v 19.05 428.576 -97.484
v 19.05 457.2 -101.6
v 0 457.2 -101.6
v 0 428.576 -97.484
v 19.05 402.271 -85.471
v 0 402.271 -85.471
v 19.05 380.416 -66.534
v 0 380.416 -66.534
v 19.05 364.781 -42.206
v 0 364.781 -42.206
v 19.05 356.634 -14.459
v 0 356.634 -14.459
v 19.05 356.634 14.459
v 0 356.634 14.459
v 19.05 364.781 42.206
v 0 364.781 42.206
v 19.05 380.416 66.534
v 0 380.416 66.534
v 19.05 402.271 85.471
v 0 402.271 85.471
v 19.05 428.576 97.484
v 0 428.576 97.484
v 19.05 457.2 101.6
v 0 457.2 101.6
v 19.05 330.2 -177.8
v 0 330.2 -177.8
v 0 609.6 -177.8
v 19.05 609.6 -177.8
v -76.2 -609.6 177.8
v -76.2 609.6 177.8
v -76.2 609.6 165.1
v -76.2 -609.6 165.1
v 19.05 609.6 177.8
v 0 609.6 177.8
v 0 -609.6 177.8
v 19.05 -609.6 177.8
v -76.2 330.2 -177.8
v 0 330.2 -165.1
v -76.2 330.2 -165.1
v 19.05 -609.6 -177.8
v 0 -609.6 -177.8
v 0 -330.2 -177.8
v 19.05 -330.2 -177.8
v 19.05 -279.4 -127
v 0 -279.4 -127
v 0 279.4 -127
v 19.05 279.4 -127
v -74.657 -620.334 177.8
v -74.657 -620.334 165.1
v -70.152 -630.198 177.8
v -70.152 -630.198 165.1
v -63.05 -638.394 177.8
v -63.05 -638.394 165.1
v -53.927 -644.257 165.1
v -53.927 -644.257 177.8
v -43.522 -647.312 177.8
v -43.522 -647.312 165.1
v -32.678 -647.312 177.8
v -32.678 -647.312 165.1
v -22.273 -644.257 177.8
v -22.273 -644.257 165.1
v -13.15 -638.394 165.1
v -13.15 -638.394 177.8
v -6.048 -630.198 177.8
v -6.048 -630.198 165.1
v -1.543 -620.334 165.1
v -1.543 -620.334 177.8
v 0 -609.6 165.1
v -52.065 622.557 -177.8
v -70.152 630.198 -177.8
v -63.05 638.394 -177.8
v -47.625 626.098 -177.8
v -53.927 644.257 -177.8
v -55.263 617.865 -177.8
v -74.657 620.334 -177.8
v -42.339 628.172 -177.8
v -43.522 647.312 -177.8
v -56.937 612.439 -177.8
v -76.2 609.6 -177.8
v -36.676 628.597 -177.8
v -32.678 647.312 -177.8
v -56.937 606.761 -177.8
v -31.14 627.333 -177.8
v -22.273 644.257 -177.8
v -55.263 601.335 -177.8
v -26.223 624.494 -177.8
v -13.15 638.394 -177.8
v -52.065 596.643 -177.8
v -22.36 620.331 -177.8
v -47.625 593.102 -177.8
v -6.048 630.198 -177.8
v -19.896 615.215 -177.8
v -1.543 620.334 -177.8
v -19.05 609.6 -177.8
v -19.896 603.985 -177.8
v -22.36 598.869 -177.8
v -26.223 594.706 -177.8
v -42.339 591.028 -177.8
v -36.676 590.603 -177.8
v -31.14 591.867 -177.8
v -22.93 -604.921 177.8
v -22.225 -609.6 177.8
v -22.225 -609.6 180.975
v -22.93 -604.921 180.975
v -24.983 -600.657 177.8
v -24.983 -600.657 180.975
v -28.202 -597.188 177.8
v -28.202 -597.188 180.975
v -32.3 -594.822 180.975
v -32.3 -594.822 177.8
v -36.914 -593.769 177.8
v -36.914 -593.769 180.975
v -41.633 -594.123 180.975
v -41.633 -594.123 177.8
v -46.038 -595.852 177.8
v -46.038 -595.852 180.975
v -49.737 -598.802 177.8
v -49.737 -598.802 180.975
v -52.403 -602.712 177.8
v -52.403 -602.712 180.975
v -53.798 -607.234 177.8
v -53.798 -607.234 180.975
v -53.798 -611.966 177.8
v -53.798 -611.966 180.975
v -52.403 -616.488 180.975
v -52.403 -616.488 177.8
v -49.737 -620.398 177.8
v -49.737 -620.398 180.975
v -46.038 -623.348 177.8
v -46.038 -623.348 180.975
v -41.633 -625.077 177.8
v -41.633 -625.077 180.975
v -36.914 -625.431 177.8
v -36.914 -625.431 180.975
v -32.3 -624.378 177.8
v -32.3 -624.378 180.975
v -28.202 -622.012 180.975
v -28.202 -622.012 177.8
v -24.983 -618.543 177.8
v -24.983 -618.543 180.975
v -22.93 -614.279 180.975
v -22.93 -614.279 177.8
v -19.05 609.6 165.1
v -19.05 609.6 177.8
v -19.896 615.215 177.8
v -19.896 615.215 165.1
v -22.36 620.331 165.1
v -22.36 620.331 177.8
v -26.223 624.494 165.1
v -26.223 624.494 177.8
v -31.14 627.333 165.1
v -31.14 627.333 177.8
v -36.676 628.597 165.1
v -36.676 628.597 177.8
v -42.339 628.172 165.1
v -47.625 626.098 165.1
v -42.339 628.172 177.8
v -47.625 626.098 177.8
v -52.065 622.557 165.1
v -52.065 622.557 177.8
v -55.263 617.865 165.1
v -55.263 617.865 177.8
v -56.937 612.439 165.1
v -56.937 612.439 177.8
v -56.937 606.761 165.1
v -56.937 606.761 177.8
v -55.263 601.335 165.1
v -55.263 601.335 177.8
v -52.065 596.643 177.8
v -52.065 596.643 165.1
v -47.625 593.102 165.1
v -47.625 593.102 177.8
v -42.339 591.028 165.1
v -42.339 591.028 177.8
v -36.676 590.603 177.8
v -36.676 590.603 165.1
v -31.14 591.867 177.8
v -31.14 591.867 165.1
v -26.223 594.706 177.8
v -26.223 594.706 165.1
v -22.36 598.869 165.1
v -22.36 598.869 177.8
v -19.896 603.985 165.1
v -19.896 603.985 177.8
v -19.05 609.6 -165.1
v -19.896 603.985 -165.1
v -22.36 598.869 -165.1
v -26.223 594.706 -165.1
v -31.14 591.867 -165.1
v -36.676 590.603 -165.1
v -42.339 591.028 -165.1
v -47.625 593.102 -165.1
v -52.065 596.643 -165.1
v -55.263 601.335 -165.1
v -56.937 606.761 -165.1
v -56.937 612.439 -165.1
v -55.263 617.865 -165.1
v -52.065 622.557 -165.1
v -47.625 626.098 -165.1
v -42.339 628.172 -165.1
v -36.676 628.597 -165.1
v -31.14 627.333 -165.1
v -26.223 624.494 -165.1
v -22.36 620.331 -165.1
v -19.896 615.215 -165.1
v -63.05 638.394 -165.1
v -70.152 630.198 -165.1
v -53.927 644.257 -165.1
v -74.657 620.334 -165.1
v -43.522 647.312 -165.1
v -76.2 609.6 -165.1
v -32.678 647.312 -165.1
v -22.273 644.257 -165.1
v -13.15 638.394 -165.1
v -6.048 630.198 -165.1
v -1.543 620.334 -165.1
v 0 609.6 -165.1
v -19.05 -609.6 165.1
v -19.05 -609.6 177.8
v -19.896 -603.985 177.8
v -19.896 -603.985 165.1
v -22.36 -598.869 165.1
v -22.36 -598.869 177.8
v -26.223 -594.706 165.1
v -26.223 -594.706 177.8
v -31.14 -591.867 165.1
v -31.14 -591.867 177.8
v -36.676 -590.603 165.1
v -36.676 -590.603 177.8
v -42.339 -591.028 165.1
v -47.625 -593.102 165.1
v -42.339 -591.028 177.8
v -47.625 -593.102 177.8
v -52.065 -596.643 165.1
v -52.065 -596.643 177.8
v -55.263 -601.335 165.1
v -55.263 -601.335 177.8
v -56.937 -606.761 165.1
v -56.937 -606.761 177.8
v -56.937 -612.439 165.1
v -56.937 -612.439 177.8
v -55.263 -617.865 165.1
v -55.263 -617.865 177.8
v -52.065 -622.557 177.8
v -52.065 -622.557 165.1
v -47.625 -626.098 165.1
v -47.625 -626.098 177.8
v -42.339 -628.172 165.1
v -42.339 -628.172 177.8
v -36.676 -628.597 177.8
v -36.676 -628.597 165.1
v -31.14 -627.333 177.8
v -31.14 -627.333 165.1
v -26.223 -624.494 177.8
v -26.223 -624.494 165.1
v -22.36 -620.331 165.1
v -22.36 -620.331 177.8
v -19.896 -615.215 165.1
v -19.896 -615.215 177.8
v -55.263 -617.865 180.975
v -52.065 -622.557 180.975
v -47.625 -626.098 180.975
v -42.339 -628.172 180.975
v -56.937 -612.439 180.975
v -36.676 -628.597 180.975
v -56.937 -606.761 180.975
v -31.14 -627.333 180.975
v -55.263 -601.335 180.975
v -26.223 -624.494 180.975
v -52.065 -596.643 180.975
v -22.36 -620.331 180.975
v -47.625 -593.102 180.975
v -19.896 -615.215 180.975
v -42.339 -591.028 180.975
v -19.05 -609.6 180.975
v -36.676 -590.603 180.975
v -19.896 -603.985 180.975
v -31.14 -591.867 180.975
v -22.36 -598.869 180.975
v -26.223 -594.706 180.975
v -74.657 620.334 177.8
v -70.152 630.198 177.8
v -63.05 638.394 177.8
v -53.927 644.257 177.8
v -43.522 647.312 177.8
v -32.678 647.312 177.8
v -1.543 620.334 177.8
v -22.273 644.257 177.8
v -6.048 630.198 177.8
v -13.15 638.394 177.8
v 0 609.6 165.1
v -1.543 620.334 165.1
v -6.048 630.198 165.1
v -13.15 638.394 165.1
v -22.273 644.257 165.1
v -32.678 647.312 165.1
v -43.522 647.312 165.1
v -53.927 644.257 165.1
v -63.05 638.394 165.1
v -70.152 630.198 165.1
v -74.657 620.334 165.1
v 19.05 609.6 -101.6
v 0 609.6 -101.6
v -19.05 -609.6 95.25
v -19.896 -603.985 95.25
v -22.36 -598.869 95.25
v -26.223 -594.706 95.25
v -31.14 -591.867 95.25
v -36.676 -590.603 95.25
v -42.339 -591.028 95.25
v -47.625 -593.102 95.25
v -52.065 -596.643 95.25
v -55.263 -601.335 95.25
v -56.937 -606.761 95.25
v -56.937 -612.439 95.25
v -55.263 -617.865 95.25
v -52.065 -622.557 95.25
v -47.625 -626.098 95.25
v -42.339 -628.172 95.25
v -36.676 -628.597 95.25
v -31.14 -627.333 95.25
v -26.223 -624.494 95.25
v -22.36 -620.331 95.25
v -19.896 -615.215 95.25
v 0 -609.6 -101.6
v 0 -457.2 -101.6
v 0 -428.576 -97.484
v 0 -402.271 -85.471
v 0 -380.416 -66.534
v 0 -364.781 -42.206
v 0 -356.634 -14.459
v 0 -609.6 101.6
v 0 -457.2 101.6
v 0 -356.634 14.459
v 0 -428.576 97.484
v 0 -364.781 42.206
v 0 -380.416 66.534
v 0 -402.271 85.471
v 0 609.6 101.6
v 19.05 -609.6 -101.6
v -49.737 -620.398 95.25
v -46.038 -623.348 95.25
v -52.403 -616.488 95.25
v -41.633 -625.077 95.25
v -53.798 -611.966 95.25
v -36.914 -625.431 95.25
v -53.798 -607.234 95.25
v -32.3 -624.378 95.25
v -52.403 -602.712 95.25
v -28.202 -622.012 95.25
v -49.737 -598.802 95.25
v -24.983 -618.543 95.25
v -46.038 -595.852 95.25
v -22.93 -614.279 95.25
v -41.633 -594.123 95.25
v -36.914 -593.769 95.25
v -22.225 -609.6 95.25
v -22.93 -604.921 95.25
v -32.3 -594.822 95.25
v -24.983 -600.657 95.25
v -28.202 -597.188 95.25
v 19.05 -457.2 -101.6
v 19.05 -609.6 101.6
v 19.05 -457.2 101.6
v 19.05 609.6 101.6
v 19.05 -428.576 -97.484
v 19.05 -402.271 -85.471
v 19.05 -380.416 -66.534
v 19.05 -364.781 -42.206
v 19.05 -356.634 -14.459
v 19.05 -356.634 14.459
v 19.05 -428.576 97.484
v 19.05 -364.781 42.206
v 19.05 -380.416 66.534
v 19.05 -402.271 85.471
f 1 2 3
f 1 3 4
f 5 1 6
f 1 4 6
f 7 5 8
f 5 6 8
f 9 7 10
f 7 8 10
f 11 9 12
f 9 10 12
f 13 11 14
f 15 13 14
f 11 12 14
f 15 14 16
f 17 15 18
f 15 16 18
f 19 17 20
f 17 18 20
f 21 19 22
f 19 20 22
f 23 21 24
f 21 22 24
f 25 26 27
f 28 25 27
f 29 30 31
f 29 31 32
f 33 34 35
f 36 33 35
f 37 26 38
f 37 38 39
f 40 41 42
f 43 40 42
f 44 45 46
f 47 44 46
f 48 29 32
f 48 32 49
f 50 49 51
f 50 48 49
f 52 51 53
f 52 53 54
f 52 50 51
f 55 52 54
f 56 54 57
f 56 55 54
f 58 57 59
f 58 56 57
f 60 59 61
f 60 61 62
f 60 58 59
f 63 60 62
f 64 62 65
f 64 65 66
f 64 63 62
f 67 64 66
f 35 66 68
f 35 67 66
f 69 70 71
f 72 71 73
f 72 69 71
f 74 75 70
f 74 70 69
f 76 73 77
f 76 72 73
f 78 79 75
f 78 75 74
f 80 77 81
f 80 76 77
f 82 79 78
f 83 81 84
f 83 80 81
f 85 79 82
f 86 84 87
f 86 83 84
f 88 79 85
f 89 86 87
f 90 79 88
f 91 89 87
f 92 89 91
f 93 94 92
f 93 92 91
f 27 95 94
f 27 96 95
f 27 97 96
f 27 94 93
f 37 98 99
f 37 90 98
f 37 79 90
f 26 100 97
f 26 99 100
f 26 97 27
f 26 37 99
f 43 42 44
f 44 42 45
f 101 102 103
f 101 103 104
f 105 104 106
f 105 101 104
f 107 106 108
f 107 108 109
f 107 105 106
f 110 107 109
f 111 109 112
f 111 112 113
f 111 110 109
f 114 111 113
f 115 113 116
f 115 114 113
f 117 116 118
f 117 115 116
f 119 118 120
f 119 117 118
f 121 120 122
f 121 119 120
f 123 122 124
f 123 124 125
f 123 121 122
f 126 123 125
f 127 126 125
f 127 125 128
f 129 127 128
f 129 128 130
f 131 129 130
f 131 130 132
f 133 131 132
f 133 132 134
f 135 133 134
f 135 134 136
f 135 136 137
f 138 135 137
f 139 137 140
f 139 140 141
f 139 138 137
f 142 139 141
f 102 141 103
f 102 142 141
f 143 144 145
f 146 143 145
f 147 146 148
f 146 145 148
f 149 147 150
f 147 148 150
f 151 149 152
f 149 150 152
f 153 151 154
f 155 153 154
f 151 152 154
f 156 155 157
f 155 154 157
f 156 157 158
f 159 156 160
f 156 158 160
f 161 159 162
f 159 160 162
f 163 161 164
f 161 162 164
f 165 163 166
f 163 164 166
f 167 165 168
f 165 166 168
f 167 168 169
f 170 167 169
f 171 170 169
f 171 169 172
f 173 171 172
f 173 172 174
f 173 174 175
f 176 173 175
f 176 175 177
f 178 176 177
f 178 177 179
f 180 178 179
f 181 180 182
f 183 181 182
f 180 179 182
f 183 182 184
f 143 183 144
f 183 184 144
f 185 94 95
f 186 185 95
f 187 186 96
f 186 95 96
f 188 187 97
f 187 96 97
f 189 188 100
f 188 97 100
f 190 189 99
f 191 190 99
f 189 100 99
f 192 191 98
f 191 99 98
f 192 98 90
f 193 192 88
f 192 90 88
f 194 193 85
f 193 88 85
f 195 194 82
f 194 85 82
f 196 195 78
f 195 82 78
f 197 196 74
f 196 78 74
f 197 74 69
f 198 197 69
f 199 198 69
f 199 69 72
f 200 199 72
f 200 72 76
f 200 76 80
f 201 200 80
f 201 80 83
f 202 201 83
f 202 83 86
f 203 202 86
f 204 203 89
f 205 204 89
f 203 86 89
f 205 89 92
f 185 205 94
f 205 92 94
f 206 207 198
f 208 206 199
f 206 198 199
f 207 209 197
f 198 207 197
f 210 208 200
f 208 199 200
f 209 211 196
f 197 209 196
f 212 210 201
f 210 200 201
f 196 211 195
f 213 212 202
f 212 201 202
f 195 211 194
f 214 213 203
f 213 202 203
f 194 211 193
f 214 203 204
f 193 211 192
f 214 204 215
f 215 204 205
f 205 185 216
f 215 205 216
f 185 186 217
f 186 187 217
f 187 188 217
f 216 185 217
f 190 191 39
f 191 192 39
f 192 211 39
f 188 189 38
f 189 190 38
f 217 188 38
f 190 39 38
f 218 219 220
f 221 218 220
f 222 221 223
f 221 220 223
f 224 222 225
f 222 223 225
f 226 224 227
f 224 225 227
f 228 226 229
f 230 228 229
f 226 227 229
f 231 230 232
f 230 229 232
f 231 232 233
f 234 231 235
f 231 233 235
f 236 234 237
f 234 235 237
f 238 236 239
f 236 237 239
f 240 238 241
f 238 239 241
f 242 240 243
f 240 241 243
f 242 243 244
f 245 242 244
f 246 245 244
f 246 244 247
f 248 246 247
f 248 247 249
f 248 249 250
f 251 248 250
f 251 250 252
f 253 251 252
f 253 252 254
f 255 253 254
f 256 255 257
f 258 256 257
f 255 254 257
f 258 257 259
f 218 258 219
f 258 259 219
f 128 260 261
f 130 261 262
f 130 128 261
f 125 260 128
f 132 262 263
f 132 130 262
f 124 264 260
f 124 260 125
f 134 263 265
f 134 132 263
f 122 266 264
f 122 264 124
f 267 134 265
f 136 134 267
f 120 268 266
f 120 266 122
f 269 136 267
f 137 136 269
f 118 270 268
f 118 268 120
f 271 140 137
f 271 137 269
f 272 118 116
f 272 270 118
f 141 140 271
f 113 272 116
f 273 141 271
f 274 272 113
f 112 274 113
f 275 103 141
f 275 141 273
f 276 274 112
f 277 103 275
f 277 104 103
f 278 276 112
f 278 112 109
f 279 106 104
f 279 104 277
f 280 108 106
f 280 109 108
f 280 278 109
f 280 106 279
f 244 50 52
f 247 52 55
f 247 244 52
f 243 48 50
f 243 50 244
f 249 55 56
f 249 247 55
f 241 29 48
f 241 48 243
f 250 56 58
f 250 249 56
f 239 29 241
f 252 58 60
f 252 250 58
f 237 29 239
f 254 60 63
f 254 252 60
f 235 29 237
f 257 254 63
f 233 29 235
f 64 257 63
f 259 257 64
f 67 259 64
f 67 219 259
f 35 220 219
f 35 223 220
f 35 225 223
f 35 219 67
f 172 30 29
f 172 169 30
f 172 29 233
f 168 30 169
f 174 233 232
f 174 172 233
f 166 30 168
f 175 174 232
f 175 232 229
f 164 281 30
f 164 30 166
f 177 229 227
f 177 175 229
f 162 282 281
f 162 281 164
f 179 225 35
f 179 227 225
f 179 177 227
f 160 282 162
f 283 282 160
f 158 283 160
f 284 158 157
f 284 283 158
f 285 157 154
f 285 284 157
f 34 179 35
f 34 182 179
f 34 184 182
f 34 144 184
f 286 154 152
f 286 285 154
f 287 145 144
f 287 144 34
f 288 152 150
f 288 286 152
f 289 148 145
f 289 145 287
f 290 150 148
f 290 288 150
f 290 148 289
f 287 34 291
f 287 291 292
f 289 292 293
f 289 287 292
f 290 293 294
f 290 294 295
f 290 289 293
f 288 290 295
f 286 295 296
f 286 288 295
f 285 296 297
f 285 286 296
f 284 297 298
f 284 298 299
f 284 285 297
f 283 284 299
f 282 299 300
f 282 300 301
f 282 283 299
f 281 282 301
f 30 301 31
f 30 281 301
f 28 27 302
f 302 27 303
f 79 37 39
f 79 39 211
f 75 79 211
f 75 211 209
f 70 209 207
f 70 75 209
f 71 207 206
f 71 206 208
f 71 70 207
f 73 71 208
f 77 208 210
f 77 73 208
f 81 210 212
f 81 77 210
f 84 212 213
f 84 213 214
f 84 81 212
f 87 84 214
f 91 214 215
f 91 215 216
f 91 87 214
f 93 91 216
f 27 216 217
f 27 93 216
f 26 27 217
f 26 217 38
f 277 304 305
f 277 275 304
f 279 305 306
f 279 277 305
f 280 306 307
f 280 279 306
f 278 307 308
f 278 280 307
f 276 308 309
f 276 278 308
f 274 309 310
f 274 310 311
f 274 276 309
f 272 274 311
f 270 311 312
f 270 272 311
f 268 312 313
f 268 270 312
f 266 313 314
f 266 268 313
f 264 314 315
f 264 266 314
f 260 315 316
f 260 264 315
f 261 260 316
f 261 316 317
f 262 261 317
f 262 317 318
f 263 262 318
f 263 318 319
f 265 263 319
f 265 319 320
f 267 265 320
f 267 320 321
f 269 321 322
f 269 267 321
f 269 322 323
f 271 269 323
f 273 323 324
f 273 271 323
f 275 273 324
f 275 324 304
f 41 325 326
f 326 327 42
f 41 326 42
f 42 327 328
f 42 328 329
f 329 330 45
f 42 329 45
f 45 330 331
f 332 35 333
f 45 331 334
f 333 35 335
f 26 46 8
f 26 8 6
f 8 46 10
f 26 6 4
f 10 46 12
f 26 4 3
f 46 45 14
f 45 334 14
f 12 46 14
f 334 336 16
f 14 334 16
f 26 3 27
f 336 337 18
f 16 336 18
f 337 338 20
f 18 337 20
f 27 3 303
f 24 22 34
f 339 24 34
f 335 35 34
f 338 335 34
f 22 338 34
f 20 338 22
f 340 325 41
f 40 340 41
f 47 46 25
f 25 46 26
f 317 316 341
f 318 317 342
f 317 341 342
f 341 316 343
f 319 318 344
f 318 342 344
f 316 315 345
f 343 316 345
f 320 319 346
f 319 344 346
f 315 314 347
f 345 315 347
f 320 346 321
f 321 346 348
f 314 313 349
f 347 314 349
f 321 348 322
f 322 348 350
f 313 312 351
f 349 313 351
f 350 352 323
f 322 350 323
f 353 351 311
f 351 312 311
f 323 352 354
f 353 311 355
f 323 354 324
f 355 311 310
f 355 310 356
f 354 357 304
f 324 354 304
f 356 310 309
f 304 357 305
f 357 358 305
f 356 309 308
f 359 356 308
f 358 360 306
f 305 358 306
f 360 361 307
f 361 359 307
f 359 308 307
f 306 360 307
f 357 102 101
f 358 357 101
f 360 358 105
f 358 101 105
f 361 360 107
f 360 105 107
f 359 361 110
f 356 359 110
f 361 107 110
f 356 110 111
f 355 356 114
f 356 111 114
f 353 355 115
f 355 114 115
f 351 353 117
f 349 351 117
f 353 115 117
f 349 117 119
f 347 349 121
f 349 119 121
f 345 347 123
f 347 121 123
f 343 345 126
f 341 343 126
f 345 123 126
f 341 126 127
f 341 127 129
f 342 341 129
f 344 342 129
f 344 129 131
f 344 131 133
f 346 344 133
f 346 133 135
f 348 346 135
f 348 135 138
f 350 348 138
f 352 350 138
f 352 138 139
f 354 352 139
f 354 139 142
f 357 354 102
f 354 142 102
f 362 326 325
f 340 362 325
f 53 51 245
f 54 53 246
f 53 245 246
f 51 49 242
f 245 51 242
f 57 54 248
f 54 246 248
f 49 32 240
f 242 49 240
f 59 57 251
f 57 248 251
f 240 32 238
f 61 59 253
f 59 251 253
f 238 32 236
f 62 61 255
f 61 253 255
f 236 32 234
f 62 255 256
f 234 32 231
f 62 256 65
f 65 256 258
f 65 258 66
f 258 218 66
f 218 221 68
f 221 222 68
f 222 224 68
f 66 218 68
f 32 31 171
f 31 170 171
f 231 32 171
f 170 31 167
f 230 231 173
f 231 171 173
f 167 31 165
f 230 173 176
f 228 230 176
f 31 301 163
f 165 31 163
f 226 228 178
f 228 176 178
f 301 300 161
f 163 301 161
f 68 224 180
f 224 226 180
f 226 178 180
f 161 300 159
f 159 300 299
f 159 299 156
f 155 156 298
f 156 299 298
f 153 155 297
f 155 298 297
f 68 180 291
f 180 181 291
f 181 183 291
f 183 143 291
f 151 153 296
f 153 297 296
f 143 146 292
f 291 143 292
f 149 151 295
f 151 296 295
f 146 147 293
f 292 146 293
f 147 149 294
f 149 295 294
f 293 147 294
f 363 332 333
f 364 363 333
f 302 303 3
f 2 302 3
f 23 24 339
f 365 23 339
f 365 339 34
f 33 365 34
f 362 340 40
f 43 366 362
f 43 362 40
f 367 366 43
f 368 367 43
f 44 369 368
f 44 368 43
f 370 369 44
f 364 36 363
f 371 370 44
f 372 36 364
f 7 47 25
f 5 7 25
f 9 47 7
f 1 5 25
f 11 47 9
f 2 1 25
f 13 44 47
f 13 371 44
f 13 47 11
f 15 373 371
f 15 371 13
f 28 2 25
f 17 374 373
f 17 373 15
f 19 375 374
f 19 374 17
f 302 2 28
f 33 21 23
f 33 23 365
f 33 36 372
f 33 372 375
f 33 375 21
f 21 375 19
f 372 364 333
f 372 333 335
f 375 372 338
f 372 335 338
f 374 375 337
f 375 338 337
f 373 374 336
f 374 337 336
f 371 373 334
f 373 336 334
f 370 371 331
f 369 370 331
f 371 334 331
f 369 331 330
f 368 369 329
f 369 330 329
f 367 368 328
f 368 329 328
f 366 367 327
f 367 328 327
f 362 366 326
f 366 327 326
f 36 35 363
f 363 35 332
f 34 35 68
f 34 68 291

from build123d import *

# Parameters (mm, degrees)
F1_DEPTH      = 19.05
F2_R          = 19.05
F3_DEPTH      = 12.7
F4_R          = 19.05
F5_DEPTH      = 12.7
F6_R          = 19.05
F6_R_2        = 15.875
F7_DEPTH      = 3.175
F7_DEPTH_BACK = 82.55


with BuildPart() as f1:
    # F0 (on Right) → F1 (new body)
    with BuildSketch(Plane.YZ):
        with BuildLine():
            Line((609.6, 177.8), (-609.6, 177.8))
            Line((-609.6, 177.8), (-609.6, 101.6))
            Line((-609.6, 101.6), (-457.2, 101.6))
            ThreePointArc((-457.2, 101.6), (-355.6, 0), (-457.2, -101.6))
            Line((-457.2, -101.6), (-609.6, -101.6))
            Line((-609.6, -101.6), (-609.6, -177.8))
            Line((-609.6, -177.8), (-330.2, -177.8))
            Line((-330.2, -177.8), (-279.4, -127))
            Line((-279.4, -127), (279.4, -127))
            Line((279.4, -127), (330.2, -177.8))
            Line((330.2, -177.8), (609.6, -177.8))
            Line((609.6, -177.8), (609.6, -101.6))
            Line((609.6, -101.6), (457.2, -101.6))
            ThreePointArc((457.2, -101.6), (355.6, 0), (457.2, 101.6))
            Line((457.2, 101.6), (609.6, 101.6))
            Line((609.6, 101.6), (609.6, 177.8))
        make_face()
    extrude(amount=F1_DEPTH)


with BuildPart() as f3:
    # F2 (on face) → F3 (new body)
    with BuildSketch(Plane.XY.offset(177.8)):
        with BuildLine():
            ThreePointArc((-76.2, -609.6), (-38.1, -647.7), (0, -609.6))
            Line((0, -609.6), (0, 609.6))
            ThreePointArc((0, 609.6), (-38.1, 647.7), (-76.2, 609.6))
            Line((-76.2, 609.6), (-76.2, -609.6))
        make_face()
        with Locations((-38.1, -609.6)):
            Circle(F2_R, mode=Mode.SUBTRACT)
        with Locations((-38.1, 609.6)):
            Circle(F2_R, mode=Mode.SUBTRACT)
    extrude(amount=-F3_DEPTH)


with BuildPart() as f5:
    # F4 (on face) → F5 (new body)
    with BuildSketch(Plane(origin=(0, 0, -177.8), x_dir=(1, 0, 0), z_dir=(0, 0, -1))):
        with BuildLine():
            Line((0, -609.6), (0, -330.2))
            Line((0, -330.2), (-76.2, -330.2))
            Line((-76.2, -330.2), (-76.2, -609.6))
            ThreePointArc((-76.2, -609.6), (-38.1, -647.7), (0, -609.6))
        make_face()
        with Locations((-38.1, -609.6)):
            Circle(F4_R, mode=Mode.SUBTRACT)
    extrude(amount=-F5_DEPTH)


with BuildPart() as f7:
    # F6 (on face) → F7 (new body, two sides)
    with BuildSketch(Plane.XY.offset(177.8)) as f7_sk:
        with Locations((-38.1, -609.6)):
            Circle(F6_R)
        with Locations((-38.1, -609.6)):
            Circle(F6_R_2, mode=Mode.SUBTRACT)
    extrude(amount=F7_DEPTH)
    extrude(f7_sk.sketch, amount=-F7_DEPTH_BACK)


solid = Compound([f1.part, f3.part, f5.part, f7.part])
